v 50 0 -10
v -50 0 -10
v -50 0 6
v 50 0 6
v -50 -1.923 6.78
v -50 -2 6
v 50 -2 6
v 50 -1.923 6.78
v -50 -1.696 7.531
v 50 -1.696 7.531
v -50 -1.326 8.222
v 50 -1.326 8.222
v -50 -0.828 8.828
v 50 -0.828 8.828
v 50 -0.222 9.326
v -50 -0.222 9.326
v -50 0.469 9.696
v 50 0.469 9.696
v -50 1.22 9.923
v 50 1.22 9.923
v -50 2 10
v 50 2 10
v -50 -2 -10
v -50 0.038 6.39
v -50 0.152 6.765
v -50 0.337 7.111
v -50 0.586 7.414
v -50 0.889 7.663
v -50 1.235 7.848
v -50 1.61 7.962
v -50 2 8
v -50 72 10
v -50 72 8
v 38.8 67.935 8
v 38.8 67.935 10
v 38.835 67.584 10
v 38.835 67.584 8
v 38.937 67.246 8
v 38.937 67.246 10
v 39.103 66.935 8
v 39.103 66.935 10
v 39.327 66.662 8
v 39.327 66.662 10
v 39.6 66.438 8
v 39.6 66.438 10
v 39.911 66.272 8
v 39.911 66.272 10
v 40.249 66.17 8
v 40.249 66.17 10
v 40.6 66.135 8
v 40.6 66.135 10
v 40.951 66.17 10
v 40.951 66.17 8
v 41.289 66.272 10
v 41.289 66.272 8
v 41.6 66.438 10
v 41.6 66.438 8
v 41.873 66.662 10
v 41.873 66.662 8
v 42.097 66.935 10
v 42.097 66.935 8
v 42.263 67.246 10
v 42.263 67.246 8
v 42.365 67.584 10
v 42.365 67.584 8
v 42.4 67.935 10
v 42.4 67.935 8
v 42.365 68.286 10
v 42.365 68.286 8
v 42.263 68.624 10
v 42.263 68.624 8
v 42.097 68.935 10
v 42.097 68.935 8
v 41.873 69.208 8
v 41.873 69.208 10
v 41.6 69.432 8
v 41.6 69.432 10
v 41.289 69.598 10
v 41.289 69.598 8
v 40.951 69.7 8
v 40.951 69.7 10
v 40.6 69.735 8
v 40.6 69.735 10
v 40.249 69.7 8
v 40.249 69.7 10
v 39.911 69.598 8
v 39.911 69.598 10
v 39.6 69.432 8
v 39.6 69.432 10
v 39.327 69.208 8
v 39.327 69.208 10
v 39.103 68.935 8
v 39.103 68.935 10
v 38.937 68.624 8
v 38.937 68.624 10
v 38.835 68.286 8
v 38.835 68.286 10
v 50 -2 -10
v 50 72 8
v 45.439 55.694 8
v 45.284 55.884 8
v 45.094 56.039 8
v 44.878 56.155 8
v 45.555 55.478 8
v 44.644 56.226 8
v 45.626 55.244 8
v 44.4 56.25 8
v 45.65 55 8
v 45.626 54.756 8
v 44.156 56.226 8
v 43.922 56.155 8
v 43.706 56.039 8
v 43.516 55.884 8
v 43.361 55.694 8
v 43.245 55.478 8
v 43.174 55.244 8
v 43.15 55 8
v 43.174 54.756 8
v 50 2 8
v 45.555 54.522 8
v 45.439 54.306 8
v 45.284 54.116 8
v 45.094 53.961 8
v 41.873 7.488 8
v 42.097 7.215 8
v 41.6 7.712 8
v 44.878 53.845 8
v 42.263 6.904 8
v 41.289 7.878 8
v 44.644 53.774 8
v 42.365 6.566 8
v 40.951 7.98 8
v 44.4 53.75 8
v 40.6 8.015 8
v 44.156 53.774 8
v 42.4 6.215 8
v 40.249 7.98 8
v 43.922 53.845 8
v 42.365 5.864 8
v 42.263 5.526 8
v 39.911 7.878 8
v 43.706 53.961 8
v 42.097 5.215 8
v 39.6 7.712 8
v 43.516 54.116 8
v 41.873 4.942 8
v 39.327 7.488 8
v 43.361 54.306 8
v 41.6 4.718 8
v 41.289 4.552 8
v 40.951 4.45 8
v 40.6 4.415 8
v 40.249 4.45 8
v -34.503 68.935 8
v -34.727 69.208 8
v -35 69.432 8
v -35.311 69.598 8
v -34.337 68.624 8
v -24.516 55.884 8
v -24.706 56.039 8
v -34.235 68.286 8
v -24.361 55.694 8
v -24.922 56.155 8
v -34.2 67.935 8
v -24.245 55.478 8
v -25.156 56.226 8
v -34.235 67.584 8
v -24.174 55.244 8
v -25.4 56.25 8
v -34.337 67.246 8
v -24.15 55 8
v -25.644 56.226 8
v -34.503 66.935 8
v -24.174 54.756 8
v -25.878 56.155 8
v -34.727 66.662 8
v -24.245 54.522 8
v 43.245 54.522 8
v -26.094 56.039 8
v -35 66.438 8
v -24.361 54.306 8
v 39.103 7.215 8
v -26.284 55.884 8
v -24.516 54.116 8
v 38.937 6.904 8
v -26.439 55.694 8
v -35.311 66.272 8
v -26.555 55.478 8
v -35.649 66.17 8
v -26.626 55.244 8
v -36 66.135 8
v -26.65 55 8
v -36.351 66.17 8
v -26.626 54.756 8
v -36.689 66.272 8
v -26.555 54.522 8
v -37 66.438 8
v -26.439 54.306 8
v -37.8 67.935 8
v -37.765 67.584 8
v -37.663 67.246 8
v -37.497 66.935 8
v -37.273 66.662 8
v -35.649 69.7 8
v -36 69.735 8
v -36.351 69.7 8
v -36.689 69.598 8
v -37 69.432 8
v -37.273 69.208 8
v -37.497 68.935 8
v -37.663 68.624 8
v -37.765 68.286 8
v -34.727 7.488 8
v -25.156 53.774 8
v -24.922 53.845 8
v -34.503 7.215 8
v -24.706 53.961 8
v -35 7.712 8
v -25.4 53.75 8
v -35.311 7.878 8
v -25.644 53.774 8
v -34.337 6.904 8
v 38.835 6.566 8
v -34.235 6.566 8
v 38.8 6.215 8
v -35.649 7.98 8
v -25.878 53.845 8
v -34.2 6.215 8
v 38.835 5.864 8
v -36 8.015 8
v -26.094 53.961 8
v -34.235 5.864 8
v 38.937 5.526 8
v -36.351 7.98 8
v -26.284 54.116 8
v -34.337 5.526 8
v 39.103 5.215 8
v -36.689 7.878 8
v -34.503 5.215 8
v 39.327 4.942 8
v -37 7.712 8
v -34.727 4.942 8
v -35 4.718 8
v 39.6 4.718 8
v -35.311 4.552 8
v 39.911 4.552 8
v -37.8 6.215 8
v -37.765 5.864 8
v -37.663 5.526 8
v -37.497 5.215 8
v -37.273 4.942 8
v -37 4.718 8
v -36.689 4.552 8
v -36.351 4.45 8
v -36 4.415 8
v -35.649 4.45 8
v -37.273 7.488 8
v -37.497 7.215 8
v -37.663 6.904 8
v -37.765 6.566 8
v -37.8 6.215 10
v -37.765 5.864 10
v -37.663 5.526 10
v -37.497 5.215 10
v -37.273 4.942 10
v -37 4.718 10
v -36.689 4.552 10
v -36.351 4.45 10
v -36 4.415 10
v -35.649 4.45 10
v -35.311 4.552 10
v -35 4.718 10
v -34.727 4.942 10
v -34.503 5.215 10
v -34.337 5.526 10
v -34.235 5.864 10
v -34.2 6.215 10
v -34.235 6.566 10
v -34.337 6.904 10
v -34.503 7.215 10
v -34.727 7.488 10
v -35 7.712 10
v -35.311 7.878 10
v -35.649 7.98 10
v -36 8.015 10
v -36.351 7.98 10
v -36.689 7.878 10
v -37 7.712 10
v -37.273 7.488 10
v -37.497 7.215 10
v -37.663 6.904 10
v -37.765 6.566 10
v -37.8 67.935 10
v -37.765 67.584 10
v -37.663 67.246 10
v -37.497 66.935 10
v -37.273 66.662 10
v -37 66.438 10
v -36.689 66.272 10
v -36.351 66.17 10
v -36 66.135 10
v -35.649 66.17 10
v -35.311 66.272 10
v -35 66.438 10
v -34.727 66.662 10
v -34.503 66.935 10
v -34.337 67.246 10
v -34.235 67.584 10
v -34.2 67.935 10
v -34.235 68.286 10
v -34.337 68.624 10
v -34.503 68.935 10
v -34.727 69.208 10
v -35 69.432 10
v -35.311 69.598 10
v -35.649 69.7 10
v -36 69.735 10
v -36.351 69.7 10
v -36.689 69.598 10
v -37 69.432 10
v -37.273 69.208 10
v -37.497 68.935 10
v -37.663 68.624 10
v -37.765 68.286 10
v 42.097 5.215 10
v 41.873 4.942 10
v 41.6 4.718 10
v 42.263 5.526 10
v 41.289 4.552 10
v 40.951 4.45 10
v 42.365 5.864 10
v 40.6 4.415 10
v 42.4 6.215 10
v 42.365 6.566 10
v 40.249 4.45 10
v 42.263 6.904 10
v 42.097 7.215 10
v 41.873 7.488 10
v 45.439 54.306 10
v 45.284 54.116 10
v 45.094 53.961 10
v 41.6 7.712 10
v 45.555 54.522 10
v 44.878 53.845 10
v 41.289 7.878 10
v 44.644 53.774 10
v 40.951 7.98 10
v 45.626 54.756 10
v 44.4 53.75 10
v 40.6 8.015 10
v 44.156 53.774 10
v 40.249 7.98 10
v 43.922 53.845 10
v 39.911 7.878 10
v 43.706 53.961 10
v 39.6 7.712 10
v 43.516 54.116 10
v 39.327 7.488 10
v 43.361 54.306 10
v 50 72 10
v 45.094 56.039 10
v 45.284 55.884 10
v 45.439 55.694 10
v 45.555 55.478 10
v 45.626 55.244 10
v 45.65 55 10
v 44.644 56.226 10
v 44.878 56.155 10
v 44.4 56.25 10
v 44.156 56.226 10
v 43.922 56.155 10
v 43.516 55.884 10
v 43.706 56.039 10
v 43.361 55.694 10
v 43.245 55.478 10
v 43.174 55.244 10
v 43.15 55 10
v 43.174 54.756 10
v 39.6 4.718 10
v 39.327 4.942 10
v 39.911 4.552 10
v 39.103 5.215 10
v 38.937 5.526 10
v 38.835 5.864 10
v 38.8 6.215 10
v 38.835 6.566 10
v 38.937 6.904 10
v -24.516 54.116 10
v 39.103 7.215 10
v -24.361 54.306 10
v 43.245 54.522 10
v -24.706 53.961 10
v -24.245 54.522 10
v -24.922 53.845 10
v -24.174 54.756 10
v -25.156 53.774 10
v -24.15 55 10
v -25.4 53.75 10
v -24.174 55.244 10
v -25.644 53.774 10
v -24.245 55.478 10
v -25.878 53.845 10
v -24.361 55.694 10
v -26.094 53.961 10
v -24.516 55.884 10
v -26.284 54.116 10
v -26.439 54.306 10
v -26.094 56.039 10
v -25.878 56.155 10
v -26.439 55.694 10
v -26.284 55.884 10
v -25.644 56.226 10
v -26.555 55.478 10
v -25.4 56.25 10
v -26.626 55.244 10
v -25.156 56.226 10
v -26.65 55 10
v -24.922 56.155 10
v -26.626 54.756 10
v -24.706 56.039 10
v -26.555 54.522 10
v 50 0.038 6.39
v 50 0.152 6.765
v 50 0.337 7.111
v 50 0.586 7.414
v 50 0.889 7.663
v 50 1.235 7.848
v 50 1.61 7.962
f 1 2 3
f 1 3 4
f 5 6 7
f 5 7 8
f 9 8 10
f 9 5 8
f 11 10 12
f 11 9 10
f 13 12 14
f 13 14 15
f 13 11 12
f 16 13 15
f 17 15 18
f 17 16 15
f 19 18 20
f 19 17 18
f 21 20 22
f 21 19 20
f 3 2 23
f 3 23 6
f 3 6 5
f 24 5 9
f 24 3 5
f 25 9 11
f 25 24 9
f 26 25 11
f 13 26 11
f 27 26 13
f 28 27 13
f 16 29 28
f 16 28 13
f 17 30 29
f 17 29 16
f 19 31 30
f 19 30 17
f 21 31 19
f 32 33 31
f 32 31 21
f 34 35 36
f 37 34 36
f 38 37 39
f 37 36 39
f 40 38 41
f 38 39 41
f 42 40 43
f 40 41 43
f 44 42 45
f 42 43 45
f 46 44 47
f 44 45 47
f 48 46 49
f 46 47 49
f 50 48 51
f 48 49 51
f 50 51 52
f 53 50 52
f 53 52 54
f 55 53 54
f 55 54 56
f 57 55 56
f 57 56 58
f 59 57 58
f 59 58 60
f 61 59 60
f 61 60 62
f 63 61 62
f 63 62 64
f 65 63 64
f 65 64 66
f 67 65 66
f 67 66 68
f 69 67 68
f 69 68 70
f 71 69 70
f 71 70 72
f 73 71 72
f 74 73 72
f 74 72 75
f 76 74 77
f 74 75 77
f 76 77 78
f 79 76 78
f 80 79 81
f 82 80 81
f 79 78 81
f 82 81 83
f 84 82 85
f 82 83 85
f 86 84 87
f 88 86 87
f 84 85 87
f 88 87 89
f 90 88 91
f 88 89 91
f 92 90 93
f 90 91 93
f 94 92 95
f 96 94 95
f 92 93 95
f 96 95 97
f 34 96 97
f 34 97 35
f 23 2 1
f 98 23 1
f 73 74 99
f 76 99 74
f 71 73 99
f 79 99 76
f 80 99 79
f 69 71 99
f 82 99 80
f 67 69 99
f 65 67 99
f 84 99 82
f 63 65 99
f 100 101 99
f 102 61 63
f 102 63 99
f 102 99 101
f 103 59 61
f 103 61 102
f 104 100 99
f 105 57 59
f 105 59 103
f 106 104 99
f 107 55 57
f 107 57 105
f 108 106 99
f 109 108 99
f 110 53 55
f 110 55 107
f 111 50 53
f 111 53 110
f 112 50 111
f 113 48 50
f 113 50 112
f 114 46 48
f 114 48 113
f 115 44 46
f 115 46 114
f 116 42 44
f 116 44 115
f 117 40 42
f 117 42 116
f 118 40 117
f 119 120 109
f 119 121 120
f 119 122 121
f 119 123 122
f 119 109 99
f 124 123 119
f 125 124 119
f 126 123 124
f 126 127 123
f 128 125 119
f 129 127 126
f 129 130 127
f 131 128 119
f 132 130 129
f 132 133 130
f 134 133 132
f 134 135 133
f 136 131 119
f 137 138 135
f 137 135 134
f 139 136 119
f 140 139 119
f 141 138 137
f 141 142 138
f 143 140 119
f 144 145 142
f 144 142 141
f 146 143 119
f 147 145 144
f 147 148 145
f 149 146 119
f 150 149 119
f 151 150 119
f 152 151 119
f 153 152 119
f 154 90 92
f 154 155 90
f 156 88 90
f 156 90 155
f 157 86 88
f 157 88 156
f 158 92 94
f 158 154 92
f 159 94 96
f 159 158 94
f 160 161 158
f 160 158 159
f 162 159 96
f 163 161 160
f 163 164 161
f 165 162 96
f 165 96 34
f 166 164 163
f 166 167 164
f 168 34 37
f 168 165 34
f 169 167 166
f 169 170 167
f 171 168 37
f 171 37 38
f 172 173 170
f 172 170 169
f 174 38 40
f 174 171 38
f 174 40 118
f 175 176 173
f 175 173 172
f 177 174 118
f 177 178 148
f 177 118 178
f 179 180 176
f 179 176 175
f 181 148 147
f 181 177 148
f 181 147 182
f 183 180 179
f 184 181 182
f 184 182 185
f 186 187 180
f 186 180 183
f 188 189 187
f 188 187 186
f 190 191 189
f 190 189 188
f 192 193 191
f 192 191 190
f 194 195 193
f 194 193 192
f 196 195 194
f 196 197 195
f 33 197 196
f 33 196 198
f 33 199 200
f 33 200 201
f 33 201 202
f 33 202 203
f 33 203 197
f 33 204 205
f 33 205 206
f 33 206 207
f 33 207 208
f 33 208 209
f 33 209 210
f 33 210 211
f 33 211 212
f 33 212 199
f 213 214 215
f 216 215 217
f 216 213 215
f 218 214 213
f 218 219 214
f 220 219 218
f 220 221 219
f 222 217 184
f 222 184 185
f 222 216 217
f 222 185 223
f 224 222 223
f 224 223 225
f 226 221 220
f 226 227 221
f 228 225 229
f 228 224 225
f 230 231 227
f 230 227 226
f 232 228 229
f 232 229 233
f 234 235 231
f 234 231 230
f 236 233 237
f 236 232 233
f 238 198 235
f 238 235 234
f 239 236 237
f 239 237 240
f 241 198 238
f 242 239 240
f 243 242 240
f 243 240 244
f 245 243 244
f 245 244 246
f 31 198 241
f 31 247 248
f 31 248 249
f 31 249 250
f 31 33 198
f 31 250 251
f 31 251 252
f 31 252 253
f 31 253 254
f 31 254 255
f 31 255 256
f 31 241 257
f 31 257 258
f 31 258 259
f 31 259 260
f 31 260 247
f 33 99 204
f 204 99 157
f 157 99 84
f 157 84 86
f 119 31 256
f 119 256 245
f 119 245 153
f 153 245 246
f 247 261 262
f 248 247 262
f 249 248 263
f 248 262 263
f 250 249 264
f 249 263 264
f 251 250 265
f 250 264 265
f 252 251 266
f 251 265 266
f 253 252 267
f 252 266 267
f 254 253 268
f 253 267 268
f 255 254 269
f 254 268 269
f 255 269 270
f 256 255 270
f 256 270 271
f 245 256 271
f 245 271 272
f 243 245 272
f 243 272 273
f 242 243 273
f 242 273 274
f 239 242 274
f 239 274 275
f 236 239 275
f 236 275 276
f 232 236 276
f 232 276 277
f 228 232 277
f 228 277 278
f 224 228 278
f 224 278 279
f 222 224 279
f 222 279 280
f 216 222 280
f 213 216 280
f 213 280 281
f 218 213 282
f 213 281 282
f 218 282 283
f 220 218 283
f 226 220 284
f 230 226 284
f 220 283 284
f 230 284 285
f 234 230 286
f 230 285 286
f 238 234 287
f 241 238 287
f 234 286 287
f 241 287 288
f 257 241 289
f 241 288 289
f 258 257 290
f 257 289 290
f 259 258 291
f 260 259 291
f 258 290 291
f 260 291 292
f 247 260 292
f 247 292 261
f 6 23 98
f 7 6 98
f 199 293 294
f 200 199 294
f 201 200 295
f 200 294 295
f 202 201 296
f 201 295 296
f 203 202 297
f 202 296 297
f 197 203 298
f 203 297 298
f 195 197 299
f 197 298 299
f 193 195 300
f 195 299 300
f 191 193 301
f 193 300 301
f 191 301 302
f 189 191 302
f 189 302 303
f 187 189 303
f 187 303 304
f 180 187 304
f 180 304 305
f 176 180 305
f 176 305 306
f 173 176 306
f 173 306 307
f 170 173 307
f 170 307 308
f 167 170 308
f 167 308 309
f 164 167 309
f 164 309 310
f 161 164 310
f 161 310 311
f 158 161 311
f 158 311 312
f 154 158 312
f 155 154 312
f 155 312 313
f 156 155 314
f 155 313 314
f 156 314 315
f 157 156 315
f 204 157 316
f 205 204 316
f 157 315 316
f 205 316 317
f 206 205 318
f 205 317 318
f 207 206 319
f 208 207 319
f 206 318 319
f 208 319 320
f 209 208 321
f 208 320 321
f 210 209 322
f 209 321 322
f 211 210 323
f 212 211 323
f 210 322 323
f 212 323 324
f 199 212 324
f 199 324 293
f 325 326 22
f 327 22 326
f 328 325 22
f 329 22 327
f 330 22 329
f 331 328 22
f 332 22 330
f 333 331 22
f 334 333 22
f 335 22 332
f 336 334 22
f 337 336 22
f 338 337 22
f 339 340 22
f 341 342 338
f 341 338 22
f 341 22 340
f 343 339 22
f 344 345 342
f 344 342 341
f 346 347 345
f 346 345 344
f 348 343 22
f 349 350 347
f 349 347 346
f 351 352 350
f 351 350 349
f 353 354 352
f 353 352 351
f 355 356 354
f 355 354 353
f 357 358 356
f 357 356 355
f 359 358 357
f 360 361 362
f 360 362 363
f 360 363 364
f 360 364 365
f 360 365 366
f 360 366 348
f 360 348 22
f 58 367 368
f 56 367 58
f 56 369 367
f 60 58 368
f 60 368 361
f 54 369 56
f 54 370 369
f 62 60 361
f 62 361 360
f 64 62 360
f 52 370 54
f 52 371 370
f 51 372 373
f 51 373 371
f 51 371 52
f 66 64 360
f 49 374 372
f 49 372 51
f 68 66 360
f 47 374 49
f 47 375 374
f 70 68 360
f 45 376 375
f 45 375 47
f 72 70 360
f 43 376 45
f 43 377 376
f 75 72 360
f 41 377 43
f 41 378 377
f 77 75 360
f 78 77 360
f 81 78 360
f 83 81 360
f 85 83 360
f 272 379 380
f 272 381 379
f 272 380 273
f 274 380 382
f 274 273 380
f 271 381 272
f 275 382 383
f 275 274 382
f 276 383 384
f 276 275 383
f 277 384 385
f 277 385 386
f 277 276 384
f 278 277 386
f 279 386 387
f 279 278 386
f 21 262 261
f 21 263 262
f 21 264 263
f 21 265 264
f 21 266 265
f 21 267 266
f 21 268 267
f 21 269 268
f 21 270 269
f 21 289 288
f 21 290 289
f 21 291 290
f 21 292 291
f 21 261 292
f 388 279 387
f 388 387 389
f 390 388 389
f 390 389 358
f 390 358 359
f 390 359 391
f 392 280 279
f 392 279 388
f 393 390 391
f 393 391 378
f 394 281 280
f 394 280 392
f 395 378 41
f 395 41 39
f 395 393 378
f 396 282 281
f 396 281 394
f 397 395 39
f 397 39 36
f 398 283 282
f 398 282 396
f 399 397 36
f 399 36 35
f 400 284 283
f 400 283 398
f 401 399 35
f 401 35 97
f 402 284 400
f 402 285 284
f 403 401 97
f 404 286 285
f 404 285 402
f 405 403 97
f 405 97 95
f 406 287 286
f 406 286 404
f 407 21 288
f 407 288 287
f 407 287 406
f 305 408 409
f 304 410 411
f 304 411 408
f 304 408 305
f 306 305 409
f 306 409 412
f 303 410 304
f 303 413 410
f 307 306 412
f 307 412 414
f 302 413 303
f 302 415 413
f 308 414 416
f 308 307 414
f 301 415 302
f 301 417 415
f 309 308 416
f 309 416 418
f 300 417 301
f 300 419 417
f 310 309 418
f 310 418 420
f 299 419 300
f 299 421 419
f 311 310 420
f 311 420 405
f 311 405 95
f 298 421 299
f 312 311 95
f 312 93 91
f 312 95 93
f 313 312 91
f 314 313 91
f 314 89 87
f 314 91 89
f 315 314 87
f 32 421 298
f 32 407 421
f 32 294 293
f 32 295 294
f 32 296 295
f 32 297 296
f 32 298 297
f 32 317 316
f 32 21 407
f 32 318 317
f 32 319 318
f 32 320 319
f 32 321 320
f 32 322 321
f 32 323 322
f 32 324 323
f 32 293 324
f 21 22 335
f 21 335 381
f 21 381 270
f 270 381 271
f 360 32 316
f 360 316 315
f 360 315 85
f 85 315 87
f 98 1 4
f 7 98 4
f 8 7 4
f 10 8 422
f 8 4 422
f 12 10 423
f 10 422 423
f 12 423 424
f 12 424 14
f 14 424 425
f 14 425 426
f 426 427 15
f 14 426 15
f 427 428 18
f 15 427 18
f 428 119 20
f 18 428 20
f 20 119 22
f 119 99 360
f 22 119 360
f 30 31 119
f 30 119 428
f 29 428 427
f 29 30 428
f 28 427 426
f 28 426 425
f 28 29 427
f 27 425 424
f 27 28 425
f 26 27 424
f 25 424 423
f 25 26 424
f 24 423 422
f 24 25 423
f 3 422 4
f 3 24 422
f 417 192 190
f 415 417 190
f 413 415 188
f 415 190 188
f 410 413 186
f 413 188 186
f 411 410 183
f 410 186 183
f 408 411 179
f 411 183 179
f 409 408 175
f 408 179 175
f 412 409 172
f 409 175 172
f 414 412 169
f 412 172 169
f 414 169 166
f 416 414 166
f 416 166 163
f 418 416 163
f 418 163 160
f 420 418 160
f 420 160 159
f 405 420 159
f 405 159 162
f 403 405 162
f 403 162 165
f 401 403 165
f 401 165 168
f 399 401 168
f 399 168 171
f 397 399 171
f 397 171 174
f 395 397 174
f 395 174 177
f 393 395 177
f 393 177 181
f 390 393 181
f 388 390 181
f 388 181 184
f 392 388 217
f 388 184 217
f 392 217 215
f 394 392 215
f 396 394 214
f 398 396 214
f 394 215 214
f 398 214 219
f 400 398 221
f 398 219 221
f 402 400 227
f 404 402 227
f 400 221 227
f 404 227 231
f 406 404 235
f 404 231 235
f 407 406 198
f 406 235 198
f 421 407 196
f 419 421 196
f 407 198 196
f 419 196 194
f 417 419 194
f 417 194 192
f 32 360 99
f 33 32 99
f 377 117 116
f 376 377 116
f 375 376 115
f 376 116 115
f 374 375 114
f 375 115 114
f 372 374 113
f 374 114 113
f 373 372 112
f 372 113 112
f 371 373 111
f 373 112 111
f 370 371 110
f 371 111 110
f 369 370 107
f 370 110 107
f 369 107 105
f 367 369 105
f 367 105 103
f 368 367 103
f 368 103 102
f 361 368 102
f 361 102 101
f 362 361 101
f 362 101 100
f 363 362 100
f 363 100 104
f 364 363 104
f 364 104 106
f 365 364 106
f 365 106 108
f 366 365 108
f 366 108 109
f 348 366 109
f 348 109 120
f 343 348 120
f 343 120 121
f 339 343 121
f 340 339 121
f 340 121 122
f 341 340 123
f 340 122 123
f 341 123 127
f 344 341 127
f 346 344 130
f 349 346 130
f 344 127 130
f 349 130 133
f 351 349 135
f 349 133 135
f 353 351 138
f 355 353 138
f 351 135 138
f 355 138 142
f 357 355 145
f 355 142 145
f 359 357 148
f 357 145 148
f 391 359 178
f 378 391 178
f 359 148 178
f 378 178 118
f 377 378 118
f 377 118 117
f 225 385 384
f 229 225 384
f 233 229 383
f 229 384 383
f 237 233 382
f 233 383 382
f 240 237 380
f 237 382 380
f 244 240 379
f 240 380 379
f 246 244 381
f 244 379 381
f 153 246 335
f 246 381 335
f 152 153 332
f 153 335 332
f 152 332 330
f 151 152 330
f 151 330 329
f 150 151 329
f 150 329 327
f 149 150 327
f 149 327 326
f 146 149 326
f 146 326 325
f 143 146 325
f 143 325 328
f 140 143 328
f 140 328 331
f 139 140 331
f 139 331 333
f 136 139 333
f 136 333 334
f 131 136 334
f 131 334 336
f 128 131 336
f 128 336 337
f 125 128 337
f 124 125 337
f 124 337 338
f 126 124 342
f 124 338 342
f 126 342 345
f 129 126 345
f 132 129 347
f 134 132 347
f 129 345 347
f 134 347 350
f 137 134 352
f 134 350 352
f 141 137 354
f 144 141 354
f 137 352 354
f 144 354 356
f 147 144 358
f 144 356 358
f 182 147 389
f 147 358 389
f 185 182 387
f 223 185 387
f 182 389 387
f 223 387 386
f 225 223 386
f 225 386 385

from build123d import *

# Parameters (mm, degrees)
SKETCH1_W                    = 100
SKETCH1_H                    = 20
BASE_FLANGE1_DEPTH           = 2
EDGE_FLANGE1_STRIP_W         = 12
EDGE_FLANGE1_STRIP_H         = 2
EDGE_FLANGE1_STRIP_CUT_DEPTH = 100
EDGE_FLANGE1_DEPTH           = 100
M3_5_CLEARANCE_HOLE1_D       = 2.5
M3_CLEARANCE_HOLE1_D         = 3.6


# Sheet-metal steps are written as plain solids
with BuildPart() as part:
    # Sketch1 → Base-Flange1 (new body)
    with BuildSketch(Plane(origin=(0, 0, 0), x_dir=(1, 0, 0), z_dir=(0, 1, 0))):
        Rectangle(SKETCH1_W, SKETCH1_H)
    extrude(amount=-BASE_FLANGE1_DEPTH)

    # Edge-Flange1 strip (across the edge) → Edge-Flange1 strip cut (cut)
    with BuildSketch(Plane(origin=(-50, 0, 10), x_dir=(0, 0, -1), z_dir=(1, 0, 0))):
        with Locations((-2, -1)):
            Rectangle(EDGE_FLANGE1_STRIP_W, EDGE_FLANGE1_STRIP_H)
    extrude(amount=EDGE_FLANGE1_STRIP_CUT_DEPTH, mode=Mode.SUBTRACT)

    # Edge-Flange1 section (across the edge) → Edge-Flange1 (add)
    with BuildSketch(Plane(origin=(-50, 0, 10), x_dir=(0, 0, -1), z_dir=(1, 0, 0))):
        with BuildLine():
            Line((0, 2), (0, 72))
            Line((0, 72), (2, 72))
            Line((2, 72), (2, 2))
            ThreePointArc((2, 2), (2.585786438, 0.585786438), (4, 0))
            Line((4, 0), (4, -2))
            ThreePointArc((4, -2), (1.171572875, -0.828427125), (0, 2))
        make_face()
    extrude(amount=EDGE_FLANGE1_DEPTH)

    # M3.5 Clearance Hole1 (through all)
    with Locations(Plane(origin=(114.471522339, -206.957964235, 10), x_dir=(1, 0, 0), z_dir=(0, 0, 1))):
        with Locations((-139.871522339, 261.957964236), (-70.071522339, 261.957964236)):
            Hole(M3_5_CLEARANCE_HOLE1_D / 2)

    # M3 Clearance Hole1 (through all)
    with Locations(Plane(origin=(114.471522339, -206.957964235, 8), x_dir=(1, 0, 0), z_dir=(0, 0, -1))):
        with Locations((-150.471522339, -274.892964235), (-73.871522339, -274.892964235), (-73.871522339, -213.172964235), (-150.471522339, -213.172964235)):
            Hole(M3_CLEARANCE_HOLE1_D / 2)


solid = part.part
